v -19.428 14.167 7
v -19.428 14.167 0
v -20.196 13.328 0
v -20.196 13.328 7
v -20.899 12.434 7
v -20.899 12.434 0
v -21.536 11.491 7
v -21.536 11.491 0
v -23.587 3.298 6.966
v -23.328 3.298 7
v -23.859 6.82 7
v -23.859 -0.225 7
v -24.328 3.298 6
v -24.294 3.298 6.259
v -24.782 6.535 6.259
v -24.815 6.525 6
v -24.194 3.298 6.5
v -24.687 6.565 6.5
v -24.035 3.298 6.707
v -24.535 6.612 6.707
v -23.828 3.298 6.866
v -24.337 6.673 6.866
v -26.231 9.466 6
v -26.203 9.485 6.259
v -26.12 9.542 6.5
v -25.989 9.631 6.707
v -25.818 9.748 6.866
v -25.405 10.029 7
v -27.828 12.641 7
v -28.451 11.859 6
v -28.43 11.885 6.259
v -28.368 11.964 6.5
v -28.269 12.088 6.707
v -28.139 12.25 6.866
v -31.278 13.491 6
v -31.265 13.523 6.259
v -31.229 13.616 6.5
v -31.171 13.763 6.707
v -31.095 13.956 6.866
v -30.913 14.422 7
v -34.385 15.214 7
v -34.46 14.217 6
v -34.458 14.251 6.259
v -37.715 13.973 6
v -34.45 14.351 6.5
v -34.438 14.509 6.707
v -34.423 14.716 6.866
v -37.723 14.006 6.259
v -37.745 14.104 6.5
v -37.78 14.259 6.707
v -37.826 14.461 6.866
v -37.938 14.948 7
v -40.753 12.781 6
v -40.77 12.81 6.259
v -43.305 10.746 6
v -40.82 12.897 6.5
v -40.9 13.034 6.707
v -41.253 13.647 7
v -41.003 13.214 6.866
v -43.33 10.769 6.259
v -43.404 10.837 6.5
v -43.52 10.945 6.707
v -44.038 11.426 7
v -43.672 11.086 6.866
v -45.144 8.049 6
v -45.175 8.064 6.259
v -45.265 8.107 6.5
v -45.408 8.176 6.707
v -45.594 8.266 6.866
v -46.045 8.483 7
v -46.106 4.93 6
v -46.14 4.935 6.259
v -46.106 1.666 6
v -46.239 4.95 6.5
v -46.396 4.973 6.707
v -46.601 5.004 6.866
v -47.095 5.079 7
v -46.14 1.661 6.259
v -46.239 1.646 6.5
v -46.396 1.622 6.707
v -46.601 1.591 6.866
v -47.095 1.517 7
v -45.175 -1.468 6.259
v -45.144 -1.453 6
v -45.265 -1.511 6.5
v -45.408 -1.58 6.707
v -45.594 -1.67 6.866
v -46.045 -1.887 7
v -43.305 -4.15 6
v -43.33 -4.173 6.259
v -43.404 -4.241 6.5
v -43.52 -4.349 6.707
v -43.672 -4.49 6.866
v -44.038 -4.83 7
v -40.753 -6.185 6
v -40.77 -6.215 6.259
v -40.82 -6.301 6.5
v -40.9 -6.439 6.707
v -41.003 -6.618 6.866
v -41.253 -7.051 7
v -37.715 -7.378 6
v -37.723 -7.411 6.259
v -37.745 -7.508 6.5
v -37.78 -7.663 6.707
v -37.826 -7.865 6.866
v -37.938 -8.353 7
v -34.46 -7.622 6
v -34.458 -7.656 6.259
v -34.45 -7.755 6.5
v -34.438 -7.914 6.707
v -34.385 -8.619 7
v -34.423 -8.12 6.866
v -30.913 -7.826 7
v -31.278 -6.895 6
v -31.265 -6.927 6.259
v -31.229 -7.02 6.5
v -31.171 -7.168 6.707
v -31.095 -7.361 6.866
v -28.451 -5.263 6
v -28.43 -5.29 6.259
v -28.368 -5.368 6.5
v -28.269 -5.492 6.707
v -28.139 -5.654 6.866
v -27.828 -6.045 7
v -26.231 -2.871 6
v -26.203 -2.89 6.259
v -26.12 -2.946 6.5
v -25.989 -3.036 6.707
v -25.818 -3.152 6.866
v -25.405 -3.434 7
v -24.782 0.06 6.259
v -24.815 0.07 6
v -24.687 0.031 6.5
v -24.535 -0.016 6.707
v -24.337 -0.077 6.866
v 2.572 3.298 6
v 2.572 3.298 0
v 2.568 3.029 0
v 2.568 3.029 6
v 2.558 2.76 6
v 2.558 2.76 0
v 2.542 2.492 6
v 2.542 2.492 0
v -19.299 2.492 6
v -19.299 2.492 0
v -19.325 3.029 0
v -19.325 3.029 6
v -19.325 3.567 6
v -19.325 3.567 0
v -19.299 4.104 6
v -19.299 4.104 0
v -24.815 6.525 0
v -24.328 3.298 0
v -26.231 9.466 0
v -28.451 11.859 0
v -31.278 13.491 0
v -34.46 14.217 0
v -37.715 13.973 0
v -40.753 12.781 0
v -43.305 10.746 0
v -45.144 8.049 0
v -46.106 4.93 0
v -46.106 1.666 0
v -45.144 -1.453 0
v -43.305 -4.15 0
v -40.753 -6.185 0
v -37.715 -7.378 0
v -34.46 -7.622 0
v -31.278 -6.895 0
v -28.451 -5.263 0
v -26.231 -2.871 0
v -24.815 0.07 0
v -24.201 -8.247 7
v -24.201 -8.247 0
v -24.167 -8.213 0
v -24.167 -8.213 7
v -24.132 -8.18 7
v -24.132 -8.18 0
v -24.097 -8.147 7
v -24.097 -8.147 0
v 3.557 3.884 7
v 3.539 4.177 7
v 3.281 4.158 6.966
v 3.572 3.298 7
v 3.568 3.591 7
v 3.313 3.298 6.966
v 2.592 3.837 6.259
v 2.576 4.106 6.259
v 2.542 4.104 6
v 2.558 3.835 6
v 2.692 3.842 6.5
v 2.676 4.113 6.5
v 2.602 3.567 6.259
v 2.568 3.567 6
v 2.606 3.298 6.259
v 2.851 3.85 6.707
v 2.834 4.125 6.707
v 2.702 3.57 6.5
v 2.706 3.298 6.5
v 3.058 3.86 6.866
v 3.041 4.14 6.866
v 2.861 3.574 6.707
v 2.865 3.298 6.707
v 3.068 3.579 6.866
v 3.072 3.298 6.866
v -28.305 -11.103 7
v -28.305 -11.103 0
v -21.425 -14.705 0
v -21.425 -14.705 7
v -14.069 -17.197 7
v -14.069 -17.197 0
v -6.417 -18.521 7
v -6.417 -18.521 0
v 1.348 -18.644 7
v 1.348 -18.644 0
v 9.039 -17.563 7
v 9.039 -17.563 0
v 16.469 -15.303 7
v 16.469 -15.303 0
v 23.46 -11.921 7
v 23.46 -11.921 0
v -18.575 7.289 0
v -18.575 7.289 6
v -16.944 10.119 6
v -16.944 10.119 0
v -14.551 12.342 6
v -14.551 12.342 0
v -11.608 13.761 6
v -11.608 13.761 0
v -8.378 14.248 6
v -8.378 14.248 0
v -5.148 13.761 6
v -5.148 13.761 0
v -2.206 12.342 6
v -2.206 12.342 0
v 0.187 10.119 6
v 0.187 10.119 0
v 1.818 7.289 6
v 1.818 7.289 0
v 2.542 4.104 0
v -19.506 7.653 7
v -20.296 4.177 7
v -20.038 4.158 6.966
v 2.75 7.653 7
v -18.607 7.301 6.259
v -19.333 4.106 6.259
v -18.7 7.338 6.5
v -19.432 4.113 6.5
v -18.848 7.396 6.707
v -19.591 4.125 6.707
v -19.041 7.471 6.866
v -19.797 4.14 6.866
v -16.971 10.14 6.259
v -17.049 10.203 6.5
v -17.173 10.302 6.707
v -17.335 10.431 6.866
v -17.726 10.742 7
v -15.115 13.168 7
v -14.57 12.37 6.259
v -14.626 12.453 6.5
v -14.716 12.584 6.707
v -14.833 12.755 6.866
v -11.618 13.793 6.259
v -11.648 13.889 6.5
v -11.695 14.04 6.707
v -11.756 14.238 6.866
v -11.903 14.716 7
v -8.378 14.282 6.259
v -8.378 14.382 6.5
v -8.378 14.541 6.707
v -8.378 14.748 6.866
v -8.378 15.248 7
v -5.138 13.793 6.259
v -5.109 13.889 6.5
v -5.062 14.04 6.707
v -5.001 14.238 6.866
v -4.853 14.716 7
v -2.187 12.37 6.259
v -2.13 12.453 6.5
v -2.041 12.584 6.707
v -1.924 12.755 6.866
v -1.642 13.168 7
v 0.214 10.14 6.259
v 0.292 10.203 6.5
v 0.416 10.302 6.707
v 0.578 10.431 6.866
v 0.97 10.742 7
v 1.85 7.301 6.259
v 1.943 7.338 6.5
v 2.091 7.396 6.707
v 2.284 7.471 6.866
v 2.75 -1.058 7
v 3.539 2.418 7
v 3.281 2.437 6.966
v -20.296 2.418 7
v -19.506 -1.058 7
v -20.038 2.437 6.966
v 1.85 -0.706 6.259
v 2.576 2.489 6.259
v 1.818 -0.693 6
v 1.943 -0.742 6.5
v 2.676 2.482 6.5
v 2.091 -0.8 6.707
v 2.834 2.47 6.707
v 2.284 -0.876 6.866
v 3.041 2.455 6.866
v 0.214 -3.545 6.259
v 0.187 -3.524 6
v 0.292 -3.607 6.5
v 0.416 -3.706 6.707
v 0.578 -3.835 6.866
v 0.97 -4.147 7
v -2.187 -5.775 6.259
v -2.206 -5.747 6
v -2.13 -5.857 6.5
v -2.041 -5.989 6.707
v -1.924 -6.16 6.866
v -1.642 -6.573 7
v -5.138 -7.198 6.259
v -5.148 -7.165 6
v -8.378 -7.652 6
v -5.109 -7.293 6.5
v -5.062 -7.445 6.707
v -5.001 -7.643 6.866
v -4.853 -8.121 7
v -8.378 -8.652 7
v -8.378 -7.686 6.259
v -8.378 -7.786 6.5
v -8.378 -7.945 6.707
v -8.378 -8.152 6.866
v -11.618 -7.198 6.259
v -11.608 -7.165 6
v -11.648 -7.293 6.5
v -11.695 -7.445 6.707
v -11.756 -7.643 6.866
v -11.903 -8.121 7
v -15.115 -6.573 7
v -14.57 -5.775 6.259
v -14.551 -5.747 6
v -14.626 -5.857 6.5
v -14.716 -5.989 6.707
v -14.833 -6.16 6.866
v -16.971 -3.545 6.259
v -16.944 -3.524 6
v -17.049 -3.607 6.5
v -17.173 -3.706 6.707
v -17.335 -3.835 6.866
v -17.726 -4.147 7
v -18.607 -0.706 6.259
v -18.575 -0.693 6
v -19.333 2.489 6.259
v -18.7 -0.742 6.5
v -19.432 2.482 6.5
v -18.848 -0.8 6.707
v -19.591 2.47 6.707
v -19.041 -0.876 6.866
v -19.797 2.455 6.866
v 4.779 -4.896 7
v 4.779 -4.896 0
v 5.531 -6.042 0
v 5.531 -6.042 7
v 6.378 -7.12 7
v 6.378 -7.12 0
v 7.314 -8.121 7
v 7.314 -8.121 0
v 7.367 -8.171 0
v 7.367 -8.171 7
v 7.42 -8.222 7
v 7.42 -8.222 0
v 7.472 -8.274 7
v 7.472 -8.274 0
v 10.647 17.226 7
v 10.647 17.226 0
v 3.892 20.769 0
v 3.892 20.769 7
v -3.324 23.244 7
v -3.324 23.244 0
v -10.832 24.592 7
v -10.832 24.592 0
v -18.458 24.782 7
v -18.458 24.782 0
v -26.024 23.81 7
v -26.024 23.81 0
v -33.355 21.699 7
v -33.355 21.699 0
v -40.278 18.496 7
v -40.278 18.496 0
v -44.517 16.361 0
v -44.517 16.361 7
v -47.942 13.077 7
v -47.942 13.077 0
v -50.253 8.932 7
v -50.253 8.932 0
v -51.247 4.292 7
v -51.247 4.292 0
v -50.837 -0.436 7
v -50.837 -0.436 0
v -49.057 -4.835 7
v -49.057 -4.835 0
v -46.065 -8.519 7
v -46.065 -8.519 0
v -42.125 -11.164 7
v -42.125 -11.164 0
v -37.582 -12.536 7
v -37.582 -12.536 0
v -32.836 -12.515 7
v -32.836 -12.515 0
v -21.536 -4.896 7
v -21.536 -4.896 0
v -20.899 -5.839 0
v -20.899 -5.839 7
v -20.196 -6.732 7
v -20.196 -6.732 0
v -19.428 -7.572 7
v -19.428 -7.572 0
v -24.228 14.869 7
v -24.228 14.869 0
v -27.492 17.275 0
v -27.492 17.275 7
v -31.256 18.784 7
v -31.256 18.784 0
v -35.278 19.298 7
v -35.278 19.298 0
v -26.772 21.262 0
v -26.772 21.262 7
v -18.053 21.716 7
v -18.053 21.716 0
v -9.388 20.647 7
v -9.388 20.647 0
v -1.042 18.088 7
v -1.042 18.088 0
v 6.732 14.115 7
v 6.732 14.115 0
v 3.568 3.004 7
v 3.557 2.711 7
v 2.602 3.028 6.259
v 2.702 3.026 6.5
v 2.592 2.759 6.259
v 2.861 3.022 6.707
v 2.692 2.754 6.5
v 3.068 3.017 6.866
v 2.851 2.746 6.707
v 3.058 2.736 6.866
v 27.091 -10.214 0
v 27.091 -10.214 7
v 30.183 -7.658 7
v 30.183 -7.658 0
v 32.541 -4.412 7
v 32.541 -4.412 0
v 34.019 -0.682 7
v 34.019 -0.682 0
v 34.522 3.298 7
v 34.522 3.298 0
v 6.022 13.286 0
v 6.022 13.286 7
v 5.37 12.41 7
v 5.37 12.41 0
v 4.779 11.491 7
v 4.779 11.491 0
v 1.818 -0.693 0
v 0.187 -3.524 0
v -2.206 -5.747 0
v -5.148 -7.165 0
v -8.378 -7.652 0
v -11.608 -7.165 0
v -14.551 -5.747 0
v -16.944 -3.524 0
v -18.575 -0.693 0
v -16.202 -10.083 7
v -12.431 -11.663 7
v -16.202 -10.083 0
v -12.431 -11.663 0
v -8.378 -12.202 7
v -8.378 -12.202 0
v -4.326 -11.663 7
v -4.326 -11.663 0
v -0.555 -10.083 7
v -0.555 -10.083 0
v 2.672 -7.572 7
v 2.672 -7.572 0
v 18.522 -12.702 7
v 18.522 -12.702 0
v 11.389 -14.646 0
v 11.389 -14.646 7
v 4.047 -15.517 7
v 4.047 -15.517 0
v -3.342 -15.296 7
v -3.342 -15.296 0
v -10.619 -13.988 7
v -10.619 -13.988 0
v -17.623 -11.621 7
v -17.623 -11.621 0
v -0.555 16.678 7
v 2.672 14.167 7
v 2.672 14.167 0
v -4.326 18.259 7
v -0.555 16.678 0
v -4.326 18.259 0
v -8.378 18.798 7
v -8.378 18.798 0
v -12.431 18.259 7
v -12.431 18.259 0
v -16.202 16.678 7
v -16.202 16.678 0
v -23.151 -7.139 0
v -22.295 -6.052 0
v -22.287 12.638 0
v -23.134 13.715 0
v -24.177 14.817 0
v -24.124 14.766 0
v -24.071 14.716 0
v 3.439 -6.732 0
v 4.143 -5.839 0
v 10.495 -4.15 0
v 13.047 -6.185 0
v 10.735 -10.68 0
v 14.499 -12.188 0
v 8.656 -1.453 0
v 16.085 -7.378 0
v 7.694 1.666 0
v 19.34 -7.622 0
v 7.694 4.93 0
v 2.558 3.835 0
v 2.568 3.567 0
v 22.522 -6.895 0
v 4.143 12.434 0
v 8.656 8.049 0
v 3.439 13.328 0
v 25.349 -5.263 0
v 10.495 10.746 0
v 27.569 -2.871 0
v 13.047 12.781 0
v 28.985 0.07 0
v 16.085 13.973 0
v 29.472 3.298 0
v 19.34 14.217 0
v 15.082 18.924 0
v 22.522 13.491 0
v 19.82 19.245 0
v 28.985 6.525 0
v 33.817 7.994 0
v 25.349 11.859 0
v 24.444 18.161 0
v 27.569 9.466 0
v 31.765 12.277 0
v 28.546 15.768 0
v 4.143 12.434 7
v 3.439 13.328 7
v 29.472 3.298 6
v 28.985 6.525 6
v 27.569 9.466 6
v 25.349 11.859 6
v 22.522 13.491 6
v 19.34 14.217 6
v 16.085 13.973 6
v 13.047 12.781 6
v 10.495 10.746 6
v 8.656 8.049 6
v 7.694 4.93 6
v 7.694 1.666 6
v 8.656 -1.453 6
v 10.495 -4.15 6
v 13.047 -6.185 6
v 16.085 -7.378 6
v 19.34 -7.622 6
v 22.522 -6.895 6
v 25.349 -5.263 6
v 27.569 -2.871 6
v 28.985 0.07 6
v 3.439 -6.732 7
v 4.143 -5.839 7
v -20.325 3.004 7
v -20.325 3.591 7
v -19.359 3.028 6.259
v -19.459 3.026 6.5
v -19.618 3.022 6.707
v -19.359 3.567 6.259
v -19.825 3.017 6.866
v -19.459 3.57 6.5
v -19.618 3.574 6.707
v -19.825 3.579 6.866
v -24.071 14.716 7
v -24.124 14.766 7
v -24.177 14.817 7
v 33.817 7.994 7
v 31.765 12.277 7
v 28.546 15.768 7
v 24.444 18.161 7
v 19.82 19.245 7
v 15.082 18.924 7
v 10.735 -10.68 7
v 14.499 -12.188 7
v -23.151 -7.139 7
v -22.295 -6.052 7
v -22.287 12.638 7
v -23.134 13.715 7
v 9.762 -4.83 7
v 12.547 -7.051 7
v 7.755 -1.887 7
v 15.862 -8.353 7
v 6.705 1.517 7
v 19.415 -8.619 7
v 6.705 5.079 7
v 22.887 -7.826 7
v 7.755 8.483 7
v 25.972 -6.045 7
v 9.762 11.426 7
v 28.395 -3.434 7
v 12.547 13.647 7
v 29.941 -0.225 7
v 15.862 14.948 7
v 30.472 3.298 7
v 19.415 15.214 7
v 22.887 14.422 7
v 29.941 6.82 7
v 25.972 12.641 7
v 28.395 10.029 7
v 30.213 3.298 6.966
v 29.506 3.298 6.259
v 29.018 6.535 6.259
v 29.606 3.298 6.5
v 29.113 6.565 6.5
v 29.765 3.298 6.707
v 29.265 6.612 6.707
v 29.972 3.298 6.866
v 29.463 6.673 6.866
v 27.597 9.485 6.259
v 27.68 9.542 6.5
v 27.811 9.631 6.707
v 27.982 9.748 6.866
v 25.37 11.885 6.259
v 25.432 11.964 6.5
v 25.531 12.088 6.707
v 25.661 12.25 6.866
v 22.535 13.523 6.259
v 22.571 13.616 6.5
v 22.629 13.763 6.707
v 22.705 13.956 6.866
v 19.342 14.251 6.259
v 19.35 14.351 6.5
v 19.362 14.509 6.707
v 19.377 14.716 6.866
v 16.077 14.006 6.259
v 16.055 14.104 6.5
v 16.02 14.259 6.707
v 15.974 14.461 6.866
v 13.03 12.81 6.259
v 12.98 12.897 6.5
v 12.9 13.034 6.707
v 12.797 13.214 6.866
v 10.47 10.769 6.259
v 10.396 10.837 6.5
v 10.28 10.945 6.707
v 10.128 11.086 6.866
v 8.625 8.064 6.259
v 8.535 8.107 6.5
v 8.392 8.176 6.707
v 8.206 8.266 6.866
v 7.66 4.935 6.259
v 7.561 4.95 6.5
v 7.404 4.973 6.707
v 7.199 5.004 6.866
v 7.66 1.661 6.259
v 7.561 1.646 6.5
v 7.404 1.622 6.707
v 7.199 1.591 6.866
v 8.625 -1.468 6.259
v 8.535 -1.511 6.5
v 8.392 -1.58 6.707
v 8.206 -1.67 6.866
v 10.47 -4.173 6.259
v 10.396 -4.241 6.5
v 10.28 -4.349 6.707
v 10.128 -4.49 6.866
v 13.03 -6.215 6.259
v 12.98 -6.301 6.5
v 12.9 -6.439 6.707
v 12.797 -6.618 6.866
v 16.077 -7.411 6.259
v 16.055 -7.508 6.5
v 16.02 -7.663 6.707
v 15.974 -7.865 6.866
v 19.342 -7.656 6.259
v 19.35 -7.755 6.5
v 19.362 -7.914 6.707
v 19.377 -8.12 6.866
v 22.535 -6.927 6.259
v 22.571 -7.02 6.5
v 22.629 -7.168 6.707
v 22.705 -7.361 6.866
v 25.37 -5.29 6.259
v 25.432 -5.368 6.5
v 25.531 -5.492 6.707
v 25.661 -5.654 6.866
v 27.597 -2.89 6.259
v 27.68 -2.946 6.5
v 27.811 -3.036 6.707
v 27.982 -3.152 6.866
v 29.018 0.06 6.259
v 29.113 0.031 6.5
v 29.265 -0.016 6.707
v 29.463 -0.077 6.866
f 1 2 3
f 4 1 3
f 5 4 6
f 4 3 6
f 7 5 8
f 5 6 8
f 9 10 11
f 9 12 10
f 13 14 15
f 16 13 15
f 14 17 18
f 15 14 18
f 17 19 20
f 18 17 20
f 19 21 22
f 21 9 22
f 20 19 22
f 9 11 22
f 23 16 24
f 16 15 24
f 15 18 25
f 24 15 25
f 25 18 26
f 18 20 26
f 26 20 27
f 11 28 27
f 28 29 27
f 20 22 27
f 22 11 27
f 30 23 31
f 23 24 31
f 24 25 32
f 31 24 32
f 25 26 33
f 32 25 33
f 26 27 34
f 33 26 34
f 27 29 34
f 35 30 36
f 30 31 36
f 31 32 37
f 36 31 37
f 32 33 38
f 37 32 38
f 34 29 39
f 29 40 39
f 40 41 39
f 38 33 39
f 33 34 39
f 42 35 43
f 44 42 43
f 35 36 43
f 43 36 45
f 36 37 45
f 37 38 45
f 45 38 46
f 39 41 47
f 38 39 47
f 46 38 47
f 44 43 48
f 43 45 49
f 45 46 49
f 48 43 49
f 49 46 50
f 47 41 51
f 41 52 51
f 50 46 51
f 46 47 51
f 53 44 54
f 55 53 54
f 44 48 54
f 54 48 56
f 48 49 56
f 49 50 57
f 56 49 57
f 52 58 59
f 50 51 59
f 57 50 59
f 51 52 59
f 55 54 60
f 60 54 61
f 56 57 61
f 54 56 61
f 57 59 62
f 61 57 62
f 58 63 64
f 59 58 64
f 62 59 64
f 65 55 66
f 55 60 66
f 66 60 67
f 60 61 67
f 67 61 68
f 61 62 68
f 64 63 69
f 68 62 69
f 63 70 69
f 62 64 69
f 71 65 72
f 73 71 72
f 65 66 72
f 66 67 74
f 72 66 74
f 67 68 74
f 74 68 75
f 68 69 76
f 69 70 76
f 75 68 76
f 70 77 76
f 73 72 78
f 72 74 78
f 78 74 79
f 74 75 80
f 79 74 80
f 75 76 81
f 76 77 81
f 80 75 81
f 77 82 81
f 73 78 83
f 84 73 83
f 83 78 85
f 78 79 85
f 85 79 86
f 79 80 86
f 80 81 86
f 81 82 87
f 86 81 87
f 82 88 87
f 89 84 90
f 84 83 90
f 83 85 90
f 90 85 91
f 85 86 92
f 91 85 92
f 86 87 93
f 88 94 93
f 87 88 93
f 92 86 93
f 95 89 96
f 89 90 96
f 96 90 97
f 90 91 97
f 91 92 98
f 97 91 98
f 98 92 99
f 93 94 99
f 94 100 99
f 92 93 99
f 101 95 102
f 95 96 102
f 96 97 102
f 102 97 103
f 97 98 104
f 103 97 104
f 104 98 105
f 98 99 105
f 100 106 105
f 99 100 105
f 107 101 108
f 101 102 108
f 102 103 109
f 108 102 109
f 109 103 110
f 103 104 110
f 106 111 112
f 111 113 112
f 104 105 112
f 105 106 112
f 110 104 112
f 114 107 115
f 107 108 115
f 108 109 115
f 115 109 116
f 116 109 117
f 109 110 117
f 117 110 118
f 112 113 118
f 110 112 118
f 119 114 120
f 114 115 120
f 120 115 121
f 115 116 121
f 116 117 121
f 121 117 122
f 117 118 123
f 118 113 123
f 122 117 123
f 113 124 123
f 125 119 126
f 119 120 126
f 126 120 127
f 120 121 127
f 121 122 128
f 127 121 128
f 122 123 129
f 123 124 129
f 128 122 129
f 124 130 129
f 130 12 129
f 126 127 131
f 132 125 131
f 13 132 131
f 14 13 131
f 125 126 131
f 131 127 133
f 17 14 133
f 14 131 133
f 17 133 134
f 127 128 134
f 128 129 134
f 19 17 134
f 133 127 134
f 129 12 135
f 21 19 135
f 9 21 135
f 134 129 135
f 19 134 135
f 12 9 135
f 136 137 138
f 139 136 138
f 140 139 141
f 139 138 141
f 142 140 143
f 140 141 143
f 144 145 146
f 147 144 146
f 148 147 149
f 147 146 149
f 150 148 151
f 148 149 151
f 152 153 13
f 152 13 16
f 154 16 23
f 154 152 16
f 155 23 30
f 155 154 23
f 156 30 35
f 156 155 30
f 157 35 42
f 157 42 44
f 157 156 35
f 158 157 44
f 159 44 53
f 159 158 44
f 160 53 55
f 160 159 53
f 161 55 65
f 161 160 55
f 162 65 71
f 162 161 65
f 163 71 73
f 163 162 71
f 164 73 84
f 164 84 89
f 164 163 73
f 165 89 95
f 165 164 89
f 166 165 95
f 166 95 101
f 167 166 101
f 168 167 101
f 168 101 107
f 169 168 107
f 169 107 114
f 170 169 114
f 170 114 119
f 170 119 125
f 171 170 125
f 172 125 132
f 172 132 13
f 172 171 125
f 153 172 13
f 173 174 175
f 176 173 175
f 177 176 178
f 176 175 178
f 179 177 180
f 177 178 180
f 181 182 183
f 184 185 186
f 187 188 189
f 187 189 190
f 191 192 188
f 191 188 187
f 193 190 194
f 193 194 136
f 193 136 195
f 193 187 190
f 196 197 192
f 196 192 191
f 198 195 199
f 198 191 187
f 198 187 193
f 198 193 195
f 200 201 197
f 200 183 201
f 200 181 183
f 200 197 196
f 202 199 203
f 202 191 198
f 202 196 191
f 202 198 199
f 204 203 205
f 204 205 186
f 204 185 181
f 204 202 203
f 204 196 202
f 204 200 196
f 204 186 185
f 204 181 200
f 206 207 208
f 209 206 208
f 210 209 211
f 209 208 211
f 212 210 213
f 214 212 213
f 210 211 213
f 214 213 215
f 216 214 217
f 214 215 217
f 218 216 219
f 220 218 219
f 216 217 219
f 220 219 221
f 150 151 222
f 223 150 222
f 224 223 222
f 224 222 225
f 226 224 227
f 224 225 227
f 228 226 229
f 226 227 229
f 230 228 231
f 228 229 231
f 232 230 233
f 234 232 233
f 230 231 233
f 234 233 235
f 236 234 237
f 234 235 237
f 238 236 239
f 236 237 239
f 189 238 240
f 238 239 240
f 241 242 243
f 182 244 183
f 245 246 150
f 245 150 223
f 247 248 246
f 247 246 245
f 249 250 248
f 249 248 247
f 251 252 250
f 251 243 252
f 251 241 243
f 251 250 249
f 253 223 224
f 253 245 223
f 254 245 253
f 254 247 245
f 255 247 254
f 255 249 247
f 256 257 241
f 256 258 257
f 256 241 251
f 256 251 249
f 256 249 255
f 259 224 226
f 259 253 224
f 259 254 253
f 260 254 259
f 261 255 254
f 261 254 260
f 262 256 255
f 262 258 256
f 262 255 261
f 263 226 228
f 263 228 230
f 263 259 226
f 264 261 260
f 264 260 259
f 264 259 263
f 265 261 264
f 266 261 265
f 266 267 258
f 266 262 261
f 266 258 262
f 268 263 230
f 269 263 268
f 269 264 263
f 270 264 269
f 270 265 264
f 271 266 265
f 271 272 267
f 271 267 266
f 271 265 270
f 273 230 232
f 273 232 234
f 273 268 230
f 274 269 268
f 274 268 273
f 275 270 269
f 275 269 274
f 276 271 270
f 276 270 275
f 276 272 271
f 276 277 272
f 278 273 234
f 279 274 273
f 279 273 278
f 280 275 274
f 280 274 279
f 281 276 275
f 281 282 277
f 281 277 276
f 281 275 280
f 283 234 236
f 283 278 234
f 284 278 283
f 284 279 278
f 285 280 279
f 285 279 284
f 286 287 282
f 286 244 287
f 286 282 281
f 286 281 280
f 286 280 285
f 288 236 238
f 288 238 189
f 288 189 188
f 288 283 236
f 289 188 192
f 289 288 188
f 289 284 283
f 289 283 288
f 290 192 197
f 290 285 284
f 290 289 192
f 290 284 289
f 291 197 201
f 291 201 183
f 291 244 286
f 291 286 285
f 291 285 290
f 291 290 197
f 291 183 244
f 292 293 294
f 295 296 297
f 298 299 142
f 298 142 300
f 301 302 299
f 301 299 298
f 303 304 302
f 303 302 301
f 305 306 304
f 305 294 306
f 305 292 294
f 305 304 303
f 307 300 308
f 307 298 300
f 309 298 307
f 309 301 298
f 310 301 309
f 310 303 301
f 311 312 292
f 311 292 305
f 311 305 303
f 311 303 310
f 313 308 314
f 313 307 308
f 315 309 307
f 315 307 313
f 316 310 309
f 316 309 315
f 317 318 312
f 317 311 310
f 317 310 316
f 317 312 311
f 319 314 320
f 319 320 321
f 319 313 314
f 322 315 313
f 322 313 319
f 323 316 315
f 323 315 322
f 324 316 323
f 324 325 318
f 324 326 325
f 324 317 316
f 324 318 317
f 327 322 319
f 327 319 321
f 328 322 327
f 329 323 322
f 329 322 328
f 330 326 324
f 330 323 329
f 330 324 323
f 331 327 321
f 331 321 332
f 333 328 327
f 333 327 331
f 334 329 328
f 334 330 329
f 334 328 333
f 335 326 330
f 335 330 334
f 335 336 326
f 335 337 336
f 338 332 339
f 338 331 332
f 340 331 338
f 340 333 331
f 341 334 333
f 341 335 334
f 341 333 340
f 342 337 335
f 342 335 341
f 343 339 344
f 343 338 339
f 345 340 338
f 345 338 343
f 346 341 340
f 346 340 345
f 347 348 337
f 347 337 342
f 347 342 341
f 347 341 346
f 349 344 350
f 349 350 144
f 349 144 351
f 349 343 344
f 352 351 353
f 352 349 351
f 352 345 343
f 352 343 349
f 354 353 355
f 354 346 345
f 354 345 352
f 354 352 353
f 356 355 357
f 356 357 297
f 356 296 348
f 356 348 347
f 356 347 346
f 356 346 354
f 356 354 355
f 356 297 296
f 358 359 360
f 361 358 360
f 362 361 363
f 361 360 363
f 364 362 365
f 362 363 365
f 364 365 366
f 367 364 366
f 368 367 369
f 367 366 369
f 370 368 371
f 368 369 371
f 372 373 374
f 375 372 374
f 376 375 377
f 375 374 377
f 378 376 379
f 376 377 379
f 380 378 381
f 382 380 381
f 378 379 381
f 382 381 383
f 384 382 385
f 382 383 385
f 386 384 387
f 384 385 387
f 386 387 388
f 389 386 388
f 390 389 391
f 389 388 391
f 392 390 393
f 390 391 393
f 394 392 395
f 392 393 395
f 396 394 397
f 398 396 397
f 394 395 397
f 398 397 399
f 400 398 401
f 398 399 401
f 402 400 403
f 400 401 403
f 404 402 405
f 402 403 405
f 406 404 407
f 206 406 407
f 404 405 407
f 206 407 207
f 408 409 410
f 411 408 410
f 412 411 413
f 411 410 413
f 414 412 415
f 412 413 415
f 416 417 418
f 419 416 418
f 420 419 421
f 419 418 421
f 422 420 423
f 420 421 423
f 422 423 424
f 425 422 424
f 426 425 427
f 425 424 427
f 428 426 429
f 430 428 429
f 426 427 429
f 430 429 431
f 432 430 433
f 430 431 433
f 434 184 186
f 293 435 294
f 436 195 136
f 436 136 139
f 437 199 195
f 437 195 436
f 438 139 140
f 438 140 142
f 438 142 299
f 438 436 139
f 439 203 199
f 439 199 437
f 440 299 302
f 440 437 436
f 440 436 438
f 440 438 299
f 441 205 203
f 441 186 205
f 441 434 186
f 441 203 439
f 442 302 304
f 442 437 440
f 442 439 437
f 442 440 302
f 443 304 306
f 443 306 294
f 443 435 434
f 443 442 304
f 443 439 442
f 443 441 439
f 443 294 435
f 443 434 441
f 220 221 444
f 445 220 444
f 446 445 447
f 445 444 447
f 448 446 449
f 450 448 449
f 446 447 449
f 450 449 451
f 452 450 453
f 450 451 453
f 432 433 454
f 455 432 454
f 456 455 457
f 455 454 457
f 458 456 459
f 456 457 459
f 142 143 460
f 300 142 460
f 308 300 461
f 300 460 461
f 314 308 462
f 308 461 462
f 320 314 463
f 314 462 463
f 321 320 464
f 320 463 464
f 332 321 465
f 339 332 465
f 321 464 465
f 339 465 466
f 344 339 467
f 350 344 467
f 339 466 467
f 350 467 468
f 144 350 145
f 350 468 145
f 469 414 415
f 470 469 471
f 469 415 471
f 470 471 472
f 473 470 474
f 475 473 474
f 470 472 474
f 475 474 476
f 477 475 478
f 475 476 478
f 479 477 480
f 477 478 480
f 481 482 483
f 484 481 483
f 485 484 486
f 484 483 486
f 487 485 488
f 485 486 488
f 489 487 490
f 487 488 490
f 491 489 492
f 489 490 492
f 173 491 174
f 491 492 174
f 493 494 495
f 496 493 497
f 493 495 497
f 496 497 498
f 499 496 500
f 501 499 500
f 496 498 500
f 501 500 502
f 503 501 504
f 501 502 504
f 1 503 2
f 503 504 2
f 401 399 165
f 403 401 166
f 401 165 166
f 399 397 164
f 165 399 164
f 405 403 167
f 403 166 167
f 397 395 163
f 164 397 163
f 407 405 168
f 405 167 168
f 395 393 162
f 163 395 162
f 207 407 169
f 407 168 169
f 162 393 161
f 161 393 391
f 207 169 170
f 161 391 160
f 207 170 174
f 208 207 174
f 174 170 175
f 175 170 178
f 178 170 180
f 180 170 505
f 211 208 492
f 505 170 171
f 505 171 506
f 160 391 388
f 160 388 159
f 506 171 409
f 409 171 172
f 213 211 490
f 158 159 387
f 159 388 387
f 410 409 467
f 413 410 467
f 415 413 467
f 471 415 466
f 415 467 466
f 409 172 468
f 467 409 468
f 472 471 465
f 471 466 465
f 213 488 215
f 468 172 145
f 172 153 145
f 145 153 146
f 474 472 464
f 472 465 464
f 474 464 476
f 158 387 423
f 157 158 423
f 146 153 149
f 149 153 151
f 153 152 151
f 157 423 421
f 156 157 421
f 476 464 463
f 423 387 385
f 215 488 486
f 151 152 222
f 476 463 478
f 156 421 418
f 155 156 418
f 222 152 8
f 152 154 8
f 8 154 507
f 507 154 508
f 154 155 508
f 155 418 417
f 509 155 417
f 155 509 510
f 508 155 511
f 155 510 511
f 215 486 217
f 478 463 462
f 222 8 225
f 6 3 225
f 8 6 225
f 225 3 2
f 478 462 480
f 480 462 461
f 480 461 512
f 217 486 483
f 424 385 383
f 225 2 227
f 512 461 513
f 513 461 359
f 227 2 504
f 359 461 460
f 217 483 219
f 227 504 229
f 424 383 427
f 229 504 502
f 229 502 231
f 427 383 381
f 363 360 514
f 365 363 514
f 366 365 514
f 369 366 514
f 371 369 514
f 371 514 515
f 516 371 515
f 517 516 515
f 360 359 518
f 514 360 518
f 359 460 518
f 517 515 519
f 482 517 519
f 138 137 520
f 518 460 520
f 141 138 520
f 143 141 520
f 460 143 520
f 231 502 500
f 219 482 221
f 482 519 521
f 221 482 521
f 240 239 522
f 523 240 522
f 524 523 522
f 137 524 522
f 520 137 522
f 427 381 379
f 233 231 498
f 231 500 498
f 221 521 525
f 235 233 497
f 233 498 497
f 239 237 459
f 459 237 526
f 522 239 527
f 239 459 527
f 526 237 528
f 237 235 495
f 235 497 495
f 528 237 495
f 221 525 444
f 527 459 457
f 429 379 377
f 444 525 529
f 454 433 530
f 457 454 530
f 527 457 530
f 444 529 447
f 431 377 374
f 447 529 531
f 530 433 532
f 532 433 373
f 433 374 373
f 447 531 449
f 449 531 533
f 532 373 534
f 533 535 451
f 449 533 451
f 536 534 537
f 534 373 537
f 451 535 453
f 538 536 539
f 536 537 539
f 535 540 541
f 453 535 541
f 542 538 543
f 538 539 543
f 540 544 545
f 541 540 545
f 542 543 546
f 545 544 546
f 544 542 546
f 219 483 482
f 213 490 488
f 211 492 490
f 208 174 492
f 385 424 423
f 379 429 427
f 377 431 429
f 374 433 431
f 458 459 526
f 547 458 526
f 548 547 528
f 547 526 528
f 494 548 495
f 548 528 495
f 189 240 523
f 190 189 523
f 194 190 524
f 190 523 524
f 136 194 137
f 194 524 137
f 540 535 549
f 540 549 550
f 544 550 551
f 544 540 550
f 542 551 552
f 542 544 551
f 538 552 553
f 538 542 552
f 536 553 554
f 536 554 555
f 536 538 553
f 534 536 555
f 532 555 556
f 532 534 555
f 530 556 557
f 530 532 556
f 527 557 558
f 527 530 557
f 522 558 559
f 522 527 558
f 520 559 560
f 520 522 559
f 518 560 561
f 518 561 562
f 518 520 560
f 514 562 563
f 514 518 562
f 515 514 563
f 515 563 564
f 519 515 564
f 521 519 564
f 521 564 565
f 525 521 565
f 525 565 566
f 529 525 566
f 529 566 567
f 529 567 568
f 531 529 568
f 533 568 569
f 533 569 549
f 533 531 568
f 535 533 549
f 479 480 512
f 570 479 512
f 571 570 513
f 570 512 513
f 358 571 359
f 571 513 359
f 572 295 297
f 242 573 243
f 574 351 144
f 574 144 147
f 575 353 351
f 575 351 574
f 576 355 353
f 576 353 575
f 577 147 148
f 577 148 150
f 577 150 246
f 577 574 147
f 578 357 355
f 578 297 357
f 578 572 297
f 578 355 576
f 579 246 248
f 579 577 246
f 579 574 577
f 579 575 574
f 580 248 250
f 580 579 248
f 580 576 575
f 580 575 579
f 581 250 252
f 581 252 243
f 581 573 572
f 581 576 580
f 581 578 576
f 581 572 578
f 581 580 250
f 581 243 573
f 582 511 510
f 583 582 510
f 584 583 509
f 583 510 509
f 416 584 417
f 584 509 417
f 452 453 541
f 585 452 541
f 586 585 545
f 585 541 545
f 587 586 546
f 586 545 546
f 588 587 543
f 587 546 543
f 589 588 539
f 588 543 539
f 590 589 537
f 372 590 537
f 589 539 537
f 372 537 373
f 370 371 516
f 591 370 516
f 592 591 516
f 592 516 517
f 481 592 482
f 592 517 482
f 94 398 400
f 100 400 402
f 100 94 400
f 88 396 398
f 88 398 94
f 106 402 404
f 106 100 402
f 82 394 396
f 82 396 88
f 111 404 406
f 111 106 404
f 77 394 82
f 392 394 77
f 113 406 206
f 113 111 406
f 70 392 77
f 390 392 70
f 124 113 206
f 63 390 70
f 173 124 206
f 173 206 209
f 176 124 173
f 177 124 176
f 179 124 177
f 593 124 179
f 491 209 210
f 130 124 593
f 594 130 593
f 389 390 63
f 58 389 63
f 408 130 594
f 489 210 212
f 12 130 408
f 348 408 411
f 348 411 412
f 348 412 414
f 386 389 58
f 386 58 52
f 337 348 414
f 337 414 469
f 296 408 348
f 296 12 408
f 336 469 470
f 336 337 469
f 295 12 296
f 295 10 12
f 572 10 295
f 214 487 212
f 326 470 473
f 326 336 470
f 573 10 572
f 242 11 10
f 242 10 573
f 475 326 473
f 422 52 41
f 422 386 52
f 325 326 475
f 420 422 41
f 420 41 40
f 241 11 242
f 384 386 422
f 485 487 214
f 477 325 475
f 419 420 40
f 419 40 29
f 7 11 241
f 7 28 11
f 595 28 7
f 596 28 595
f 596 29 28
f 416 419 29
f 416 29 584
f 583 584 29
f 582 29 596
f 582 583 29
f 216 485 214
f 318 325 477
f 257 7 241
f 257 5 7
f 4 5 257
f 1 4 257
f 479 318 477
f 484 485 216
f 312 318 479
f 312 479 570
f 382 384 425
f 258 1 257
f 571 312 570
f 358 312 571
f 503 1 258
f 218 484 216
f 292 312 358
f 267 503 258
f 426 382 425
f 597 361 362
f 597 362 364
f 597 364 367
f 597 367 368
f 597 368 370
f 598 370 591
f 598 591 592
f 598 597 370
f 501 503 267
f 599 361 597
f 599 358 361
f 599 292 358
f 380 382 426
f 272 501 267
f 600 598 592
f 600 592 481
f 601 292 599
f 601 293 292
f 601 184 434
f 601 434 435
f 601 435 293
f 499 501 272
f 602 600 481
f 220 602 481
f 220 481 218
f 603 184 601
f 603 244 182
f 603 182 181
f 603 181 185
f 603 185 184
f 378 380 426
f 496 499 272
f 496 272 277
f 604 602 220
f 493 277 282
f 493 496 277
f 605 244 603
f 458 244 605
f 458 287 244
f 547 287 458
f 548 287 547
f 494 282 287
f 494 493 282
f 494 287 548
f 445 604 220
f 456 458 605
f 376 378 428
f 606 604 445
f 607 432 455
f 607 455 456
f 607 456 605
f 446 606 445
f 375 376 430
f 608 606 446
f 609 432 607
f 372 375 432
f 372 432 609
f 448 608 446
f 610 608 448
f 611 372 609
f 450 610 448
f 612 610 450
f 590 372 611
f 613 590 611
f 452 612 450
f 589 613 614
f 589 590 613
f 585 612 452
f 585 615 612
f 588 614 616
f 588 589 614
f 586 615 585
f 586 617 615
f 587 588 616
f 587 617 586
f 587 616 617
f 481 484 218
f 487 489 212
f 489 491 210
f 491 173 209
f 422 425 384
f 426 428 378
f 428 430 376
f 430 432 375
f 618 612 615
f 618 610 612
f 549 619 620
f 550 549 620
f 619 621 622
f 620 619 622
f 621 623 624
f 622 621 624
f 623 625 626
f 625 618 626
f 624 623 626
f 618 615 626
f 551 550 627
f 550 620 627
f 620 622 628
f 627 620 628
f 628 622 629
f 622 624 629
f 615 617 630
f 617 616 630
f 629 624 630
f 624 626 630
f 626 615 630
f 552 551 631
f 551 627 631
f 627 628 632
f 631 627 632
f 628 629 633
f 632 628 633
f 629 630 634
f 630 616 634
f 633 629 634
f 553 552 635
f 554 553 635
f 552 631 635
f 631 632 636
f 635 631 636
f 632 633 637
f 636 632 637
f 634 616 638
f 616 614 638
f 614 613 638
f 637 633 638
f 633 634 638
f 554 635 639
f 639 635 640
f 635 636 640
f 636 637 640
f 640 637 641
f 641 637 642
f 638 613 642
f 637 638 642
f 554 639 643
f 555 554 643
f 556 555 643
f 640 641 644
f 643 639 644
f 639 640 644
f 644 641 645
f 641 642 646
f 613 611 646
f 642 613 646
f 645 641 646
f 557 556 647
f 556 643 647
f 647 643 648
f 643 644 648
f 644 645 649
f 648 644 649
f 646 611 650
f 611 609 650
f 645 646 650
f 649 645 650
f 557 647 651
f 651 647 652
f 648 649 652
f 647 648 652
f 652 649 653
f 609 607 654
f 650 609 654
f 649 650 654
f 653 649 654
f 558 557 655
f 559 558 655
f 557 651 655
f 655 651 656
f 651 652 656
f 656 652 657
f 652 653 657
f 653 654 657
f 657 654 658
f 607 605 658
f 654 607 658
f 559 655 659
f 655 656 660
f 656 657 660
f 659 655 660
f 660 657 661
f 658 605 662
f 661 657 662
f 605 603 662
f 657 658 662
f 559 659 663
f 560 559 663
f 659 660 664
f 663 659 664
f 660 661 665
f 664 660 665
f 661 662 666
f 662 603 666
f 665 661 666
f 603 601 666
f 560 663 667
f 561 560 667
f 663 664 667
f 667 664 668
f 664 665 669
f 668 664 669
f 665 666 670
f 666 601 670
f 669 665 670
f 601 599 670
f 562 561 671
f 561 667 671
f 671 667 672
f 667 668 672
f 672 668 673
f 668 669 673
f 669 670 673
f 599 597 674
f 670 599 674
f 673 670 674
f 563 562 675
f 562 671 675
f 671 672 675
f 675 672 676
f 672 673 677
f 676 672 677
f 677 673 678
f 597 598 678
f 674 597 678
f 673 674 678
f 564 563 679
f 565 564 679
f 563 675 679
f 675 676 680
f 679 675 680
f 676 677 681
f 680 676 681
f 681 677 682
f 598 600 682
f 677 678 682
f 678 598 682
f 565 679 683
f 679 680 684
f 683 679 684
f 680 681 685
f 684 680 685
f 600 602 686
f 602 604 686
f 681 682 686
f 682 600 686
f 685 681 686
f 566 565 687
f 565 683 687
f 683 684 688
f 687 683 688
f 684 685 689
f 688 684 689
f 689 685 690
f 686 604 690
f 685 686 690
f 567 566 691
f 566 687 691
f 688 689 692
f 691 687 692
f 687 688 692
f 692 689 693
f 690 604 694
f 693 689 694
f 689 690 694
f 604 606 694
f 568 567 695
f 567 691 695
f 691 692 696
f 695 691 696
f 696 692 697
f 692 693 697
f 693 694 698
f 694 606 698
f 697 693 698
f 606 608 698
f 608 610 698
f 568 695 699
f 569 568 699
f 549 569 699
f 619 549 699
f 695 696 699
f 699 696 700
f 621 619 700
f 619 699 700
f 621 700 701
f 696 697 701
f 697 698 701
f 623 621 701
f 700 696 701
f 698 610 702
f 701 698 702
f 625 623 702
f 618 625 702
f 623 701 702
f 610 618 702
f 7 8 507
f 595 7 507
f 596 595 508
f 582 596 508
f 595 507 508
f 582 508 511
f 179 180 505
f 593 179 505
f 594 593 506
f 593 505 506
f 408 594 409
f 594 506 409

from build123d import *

# Parameters (mm, degrees)
F0_R     = 10.95
F1_DEPTH = 7
F2_R     = 1


with BuildPart() as f1:
    # F0 (on Top) → F1 (new body)
    with BuildSketch(Plane.XY):
        with BuildLine():
            ThreePointArc((-21.5356414958, -4.8959657474), (-23.8783924252, 3.2977389637), (-21.5356414958, 11.4914436749))
            ThreePointArc((-21.5356414958, 11.4914436749), (-22.6993144087, 13.1854483171), (-24.0705316121, 14.7163140059))
            ThreePointArc((-24.0705316121, 14.7163140059), (-24.150511625, 14.7916467191), (-24.2283924252, 14.8691476939))
            ThreePointArc((-24.2283924252, 14.8691476939), (-29.3261886183, 18.1493809552), (-35.2783924252, 19.2977389637))
            ThreePointArc((-35.2783924252, 19.2977389637), (-37.8102942344, 19.0961399344), (-40.2783924252, 18.4964231173))
            ThreePointArc((-40.2783924252, 18.4964231173), (-50.1108366069, -2.7021443349), (-28.305201053, -11.1027680443))
            ThreePointArc((-28.305201053, -11.1027680443), (-26.1407697818, -9.8363332314), (-24.200803492, -8.2472609682))
            ThreePointArc((-24.200803492, -8.2472609682), (-24.1495735944, -8.1967605248), (-24.0974438172, -8.14718953))
            ThreePointArc((-24.0974438172, -8.14718953), (-22.7109617539, -6.6047701285), (-21.5356414958, -4.8959657474))
        make_face()
        with Locations((-35.2783924252, 3.2977389637)):
            Circle(F0_R, mode=Mode.SUBTRACT)
        with BuildLine():
            ThreePointArc((-35.2783924252, 19.2977389637), (-13.6974768248, 21.3714318141), (6.7324567843, 14.1151288356))
            ThreePointArc((6.7324567843, 14.1151288356), (8.5674737327, 15.8243194809), (10.647013196, 17.2257956612))
            ThreePointArc((10.647013196, 17.2257956612), (-14.6417402019, 24.8328180176), (-40.2783924252, 18.4964231173))
            ThreePointArc((-40.2783924252, 18.4964231173), (-37.8102942344, 19.0961399344), (-35.2783924252, 19.2977389637))
        make_face()
        with BuildLine():
            ThreePointArc((-19.2986991166, 4.1035936434), (-8.3783924252, 14.2477389637), (2.5419142663, 4.1035936434))
            ThreePointArc((2.5419142663, 4.1035936434), (3.2081819329, 7.93443985), (4.7788566455, 11.4914436749))
            ThreePointArc((4.7788566455, 11.4914436749), (3.7989548826, 12.8874320009), (2.6716075748, 14.1673065724))
            ThreePointArc((2.6716075748, 14.1673065724), (-8.3783924252, 18.7977389637), (-19.4283924252, 14.1673065724))
            ThreePointArc((-19.4283924252, 14.1673065724), (-20.5557397329, 12.8874320009), (-21.5356414958, 11.4914436749))
            ThreePointArc((-21.5356414958, 11.4914436749), (-19.9649667832, 7.93443985), (-19.2986991166, 4.1035936434))
        make_face()
        with BuildLine():
            ThreePointArc((-19.2986991166, 2.4918842841), (-19.3283924252, 3.2977389637), (-19.2986991166, 4.1035936434))
            ThreePointArc((-19.2986991166, 4.1035936434), (-19.9649667832, 7.93443985), (-21.5356414958, 11.4914436749))
            ThreePointArc((-21.5356414958, 11.4914436749), (-23.8783924252, 3.2977389637), (-21.5356414958, -4.8959657474))
            ThreePointArc((-21.5356414958, -4.8959657474), (-19.9649667832, -1.3389619226), (-19.2986991166, 2.4918842841))
        make_face()
        with BuildLine():
            ThreePointArc((4.7788566455, -4.8959657474), (3.2081819329, -1.3389619226), (2.5419142663, 2.4918842841))
            ThreePointArc((2.5419142663, 2.4918842841), (-8.3783924252, -7.6522610363), (-19.2986991166, 2.4918842841))
            ThreePointArc((-19.2986991166, 2.4918842841), (-19.9649667832, -1.3389619226), (-21.5356414958, -4.8959657474))
            ThreePointArc((-21.5356414958, -4.8959657474), (-20.5557397329, -6.2919540734), (-19.4283924252, -7.571828645))
            ThreePointArc((-19.4283924252, -7.571828645), (-8.3783924252, -12.2022610363), (2.6716075748, -7.571828645))
            ThreePointArc((2.6716075748, -7.571828645), (3.7989548826, -6.2919540734), (4.7788566455, -4.8959657474))
        make_face()
        with BuildLine():
            ThreePointArc((2.5419142663, 4.1035936434), (2.5641817297, 3.7009397379), (2.5716075748, 3.2977389637))
            ThreePointArc((2.5716075748, 3.2977389637), (2.5641817297, 2.8945381895), (2.5419142663, 2.4918842841))
            ThreePointArc((2.5419142663, 2.4918842841), (3.2081819329, -1.3389619226), (4.7788566455, -4.8959657474))
            ThreePointArc((4.7788566455, -4.8959657474), (6.5244153739, -0.9632843526), (7.1216075748, 3.2977389637))
            ThreePointArc((7.1216075748, 3.2977389637), (6.5244153739, 7.5587622801), (4.7788566455, 11.4914436749))
            ThreePointArc((4.7788566455, 11.4914436749), (3.2081819329, 7.93443985), (2.5419142663, 4.1035936434))
        make_face()
        with BuildLine():
            ThreePointArc((6.7324567843, 14.1151288356), (5.6884305592, 12.8533429575), (4.7788566455, 11.4914436749))
            ThreePointArc((4.7788566455, 11.4914436749), (6.5244153739, 7.5587622801), (7.1216075748, 3.2977389637))
            ThreePointArc((7.1216075748, 3.2977389637), (6.5244153739, -0.9632843526), (4.7788566455, -4.8959657474))
            ThreePointArc((4.7788566455, -4.8959657474), (5.9425295584, -6.5899703896), (7.3137467617, -8.1208360785))
            ThreePointArc((7.3137467617, -8.1208360785), (7.3937267746, -8.1961687916), (7.4716075748, -8.2736697664))
            ThreePointArc((7.4716075748, -8.2736697664), (12.5694037679, -11.5539030277), (18.5216075748, -12.7022610363))
            ThreePointArc((18.5216075748, -12.7022610363), (21.0216075748, -12.5057416655), (23.4601952715, -11.9210110363))
            ThreePointArc((23.4601952715, -11.9210110363), (31.4641228471, -6.1092424026), (34.5216075748, 3.2977389637))
            ThreePointArc((34.5216075748, 3.2977389637), (26.584066565, 17.1178965255), (10.647013196, 17.2257956612))
            ThreePointArc((10.647013196, 17.2257956612), (8.5674737327, 15.8243194809), (6.7324567843, 14.1151288356))
        make_face()
        with Locations((18.5216075748, 3.2977389637)):
            Circle(F0_R, mode=Mode.SUBTRACT)
        with BuildLine():
            ThreePointArc((18.5216075748, -12.7022610363), (-3.3423713912, -15.2962408971), (-24.200803492, -8.2472609682))
            ThreePointArc((-24.200803492, -8.2472609682), (-26.1407697818, -9.8363332314), (-28.305201053, -11.1027680443))
            ThreePointArc((-28.305201053, -11.1027680443), (-2.5366521789, -18.7334401031), (23.4601952715, -11.9210110363))
            ThreePointArc((23.4601952715, -11.9210110363), (21.0216075748, -12.5057416655), (18.5216075748, -12.7022610363))
        make_face()
    extrude(amount=F1_DEPTH)

    # F2
    f2_edges = [f1.edges().sort_by_distance(p)[0] for p in [
        (7.571608, 3.297739, 7),
        (-19.298699, 2.491884, 7),
        (-46.228392, 3.297739, 7),
    ]]
    fillet(f2_edges, radius=F2_R)


solid = f1.part
